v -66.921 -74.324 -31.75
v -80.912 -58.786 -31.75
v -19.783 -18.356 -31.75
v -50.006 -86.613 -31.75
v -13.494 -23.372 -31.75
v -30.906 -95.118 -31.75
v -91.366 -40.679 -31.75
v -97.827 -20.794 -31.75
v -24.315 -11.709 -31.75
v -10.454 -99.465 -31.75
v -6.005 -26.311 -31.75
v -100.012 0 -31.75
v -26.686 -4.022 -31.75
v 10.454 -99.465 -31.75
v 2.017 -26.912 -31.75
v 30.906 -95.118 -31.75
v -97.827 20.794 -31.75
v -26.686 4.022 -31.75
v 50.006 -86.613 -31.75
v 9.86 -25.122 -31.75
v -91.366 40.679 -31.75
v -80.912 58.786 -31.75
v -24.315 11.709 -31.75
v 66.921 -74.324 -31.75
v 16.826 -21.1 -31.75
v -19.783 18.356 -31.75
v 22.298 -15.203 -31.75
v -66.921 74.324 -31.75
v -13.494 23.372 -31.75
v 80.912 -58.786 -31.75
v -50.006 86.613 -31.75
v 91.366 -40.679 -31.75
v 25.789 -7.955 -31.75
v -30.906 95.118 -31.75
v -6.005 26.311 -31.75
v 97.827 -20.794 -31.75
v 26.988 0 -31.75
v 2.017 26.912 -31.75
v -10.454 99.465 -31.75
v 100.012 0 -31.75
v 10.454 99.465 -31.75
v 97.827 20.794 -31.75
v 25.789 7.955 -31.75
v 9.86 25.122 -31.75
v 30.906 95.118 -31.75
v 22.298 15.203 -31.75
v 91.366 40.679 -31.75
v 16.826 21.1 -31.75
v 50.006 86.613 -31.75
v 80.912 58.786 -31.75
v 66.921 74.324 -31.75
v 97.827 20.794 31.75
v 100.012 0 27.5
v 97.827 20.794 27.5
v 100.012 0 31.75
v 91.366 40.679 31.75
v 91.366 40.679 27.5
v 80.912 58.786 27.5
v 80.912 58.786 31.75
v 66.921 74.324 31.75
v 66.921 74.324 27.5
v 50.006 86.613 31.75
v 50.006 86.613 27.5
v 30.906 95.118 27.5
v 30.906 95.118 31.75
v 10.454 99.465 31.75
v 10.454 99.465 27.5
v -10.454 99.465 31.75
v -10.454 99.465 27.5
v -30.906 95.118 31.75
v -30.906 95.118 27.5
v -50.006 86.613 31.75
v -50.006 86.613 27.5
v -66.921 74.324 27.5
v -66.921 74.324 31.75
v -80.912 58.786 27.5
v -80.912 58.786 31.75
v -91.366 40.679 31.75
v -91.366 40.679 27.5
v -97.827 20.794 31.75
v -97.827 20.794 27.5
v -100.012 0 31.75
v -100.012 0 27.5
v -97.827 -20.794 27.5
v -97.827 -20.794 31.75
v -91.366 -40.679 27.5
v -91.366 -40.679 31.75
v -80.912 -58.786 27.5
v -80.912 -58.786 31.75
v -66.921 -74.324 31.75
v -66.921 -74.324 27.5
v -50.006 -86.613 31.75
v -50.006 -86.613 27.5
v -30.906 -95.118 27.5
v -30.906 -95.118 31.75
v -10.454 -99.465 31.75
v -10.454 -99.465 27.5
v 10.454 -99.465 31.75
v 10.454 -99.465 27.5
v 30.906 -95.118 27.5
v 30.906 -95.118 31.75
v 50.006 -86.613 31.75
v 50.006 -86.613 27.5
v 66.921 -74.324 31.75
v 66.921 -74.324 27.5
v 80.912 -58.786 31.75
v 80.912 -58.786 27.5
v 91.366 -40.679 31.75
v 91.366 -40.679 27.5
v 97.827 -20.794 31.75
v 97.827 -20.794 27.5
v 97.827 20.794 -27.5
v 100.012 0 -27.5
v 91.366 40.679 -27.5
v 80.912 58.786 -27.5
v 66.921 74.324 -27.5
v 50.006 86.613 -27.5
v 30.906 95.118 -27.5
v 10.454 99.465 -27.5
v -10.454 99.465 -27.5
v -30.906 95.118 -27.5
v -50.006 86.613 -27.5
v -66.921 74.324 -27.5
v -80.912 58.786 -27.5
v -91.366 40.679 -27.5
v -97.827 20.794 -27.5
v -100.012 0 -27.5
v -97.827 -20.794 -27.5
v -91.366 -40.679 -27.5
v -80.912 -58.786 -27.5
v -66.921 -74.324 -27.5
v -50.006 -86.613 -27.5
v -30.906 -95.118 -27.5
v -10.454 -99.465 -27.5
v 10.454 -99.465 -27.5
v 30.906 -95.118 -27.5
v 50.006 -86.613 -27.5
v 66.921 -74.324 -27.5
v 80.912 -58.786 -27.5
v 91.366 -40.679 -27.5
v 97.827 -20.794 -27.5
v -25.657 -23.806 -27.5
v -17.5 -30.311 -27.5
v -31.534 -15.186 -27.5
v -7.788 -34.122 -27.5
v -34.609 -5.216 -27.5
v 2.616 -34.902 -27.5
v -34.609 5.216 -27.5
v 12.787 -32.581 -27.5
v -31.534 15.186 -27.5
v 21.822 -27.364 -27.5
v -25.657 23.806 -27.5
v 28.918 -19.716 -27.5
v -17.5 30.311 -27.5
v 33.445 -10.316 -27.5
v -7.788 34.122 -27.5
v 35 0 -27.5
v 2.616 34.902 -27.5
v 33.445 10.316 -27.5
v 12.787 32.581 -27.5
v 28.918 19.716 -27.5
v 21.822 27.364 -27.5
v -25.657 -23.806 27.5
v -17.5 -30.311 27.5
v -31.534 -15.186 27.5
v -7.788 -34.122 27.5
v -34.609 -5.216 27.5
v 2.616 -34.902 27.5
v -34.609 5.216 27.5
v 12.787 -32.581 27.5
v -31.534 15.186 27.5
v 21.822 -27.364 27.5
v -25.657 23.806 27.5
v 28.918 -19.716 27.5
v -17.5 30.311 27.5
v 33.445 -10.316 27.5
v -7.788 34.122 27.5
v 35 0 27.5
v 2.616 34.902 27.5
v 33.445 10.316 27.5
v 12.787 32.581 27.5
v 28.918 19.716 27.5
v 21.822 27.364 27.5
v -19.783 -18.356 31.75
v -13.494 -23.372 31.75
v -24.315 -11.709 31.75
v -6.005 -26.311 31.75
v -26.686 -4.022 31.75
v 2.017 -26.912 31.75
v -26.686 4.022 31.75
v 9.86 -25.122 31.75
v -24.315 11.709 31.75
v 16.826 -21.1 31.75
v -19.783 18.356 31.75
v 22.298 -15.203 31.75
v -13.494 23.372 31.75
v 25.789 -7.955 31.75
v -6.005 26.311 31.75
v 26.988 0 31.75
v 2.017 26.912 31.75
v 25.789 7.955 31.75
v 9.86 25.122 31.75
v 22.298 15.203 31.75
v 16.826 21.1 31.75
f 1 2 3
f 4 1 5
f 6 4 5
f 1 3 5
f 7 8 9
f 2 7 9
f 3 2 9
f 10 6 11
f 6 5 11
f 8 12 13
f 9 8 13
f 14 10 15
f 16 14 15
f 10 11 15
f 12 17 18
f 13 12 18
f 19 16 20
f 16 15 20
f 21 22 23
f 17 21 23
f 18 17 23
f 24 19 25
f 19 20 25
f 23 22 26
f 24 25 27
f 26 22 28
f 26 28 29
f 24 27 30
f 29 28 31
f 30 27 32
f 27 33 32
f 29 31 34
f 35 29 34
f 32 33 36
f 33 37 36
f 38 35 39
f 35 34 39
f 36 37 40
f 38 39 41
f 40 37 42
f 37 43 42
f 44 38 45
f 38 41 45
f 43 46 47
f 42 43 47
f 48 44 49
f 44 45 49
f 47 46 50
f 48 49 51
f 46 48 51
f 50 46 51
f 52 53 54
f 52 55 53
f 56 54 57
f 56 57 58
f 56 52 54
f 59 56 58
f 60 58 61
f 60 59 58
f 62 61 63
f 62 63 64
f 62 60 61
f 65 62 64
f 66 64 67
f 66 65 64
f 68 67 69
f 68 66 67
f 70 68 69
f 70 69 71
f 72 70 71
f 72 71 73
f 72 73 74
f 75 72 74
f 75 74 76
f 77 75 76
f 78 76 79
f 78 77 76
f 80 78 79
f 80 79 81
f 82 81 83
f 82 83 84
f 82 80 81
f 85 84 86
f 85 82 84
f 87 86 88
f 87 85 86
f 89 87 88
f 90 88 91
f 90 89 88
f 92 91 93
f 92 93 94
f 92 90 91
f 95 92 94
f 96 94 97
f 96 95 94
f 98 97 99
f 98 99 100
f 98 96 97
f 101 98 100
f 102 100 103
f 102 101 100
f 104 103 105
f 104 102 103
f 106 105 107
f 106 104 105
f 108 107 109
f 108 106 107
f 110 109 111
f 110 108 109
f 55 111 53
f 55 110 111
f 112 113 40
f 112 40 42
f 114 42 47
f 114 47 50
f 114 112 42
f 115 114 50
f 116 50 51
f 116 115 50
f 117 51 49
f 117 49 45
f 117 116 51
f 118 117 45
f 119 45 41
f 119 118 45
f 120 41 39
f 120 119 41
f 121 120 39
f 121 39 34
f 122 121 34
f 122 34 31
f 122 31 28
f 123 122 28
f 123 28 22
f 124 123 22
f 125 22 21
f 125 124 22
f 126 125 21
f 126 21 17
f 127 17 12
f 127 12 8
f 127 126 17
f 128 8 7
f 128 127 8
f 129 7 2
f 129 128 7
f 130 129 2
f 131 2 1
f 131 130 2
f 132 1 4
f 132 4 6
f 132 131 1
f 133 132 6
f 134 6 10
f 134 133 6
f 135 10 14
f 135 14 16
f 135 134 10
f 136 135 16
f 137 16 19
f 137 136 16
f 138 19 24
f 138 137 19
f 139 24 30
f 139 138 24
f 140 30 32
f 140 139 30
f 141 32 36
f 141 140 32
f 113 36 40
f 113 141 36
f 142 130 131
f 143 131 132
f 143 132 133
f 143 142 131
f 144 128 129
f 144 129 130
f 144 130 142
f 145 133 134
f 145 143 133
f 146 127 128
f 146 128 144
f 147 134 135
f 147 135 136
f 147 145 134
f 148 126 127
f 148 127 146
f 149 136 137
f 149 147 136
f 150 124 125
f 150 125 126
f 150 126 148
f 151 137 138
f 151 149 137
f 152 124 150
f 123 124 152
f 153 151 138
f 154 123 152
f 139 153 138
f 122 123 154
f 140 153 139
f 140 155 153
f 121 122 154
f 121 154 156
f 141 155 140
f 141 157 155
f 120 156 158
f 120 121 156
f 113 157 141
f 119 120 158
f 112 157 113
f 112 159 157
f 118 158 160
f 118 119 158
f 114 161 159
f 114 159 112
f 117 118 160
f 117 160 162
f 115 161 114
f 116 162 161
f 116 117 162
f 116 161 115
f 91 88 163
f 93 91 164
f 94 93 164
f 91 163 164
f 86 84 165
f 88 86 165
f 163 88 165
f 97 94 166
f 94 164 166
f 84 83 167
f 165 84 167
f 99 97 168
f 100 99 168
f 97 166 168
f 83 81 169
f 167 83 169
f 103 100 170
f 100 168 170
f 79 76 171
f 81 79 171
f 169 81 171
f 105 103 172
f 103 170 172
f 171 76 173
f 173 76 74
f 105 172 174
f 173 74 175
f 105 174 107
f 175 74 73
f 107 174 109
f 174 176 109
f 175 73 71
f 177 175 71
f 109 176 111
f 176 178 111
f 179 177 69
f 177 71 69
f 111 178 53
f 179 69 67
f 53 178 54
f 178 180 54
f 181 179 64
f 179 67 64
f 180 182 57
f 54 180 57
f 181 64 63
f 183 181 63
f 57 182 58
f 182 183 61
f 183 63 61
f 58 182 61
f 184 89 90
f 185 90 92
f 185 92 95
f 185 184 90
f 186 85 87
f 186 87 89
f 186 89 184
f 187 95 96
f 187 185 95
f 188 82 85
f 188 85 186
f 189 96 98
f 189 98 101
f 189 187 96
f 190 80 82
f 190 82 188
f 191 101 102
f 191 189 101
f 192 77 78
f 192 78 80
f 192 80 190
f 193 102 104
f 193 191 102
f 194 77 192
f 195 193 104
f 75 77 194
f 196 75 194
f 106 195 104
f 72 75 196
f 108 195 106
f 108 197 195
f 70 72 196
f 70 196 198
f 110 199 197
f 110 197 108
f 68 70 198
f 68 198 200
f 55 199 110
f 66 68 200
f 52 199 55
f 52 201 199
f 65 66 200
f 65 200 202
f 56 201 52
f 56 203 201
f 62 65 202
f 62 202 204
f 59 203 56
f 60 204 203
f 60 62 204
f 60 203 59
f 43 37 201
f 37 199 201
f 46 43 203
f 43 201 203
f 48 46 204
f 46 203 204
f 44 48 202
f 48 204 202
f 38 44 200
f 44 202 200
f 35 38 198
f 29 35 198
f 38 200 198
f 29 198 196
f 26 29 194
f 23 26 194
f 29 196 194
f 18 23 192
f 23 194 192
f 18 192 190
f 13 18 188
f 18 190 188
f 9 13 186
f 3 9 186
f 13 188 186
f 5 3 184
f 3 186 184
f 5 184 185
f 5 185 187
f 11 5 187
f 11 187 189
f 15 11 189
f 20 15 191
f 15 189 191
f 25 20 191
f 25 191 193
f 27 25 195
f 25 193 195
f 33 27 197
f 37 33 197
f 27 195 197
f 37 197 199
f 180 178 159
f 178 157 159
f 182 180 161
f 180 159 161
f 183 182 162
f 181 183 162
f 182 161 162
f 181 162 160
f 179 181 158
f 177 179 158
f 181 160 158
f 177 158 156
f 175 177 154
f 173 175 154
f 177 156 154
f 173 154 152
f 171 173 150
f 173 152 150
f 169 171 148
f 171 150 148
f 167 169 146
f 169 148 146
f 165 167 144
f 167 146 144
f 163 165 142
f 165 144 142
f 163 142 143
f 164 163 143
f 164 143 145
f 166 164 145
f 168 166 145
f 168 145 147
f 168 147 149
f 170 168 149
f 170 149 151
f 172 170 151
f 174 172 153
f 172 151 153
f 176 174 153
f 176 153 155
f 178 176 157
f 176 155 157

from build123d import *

# Parameters (mm, degrees)
F0_R          = 100.0125
F1_DEPTH      = 31.75
F2_R          = 125
F2_R_2        = 35
F3_DEPTH      = 27.5
F4_R          = 26.9875
F5_DEPTH      = 31.751
F5_DEPTH_BACK = 31.751


with BuildPart() as f1:
    # F0 (on Top) → F1 (new body, symmetric)
    with BuildSketch(Plane.XY):
        Circle(F0_R)
    extrude(amount=F1_DEPTH, both=True)

    # F2 (on Top) → F3 (cut, symmetric)
    with BuildSketch(Plane.XY):
        Circle(F2_R)
        Circle(F2_R_2, mode=Mode.SUBTRACT)
    extrude(amount=F3_DEPTH, both=True, mode=Mode.SUBTRACT)

    # F4 (on Top) → F5 (cut, two sides)
    with BuildSketch(Plane.XY) as f5_sk:
        Circle(F4_R)
    extrude(amount=-F5_DEPTH, mode=Mode.SUBTRACT)
    extrude(f5_sk.sketch, amount=F5_DEPTH_BACK, mode=Mode.SUBTRACT)


solid = f1.part
